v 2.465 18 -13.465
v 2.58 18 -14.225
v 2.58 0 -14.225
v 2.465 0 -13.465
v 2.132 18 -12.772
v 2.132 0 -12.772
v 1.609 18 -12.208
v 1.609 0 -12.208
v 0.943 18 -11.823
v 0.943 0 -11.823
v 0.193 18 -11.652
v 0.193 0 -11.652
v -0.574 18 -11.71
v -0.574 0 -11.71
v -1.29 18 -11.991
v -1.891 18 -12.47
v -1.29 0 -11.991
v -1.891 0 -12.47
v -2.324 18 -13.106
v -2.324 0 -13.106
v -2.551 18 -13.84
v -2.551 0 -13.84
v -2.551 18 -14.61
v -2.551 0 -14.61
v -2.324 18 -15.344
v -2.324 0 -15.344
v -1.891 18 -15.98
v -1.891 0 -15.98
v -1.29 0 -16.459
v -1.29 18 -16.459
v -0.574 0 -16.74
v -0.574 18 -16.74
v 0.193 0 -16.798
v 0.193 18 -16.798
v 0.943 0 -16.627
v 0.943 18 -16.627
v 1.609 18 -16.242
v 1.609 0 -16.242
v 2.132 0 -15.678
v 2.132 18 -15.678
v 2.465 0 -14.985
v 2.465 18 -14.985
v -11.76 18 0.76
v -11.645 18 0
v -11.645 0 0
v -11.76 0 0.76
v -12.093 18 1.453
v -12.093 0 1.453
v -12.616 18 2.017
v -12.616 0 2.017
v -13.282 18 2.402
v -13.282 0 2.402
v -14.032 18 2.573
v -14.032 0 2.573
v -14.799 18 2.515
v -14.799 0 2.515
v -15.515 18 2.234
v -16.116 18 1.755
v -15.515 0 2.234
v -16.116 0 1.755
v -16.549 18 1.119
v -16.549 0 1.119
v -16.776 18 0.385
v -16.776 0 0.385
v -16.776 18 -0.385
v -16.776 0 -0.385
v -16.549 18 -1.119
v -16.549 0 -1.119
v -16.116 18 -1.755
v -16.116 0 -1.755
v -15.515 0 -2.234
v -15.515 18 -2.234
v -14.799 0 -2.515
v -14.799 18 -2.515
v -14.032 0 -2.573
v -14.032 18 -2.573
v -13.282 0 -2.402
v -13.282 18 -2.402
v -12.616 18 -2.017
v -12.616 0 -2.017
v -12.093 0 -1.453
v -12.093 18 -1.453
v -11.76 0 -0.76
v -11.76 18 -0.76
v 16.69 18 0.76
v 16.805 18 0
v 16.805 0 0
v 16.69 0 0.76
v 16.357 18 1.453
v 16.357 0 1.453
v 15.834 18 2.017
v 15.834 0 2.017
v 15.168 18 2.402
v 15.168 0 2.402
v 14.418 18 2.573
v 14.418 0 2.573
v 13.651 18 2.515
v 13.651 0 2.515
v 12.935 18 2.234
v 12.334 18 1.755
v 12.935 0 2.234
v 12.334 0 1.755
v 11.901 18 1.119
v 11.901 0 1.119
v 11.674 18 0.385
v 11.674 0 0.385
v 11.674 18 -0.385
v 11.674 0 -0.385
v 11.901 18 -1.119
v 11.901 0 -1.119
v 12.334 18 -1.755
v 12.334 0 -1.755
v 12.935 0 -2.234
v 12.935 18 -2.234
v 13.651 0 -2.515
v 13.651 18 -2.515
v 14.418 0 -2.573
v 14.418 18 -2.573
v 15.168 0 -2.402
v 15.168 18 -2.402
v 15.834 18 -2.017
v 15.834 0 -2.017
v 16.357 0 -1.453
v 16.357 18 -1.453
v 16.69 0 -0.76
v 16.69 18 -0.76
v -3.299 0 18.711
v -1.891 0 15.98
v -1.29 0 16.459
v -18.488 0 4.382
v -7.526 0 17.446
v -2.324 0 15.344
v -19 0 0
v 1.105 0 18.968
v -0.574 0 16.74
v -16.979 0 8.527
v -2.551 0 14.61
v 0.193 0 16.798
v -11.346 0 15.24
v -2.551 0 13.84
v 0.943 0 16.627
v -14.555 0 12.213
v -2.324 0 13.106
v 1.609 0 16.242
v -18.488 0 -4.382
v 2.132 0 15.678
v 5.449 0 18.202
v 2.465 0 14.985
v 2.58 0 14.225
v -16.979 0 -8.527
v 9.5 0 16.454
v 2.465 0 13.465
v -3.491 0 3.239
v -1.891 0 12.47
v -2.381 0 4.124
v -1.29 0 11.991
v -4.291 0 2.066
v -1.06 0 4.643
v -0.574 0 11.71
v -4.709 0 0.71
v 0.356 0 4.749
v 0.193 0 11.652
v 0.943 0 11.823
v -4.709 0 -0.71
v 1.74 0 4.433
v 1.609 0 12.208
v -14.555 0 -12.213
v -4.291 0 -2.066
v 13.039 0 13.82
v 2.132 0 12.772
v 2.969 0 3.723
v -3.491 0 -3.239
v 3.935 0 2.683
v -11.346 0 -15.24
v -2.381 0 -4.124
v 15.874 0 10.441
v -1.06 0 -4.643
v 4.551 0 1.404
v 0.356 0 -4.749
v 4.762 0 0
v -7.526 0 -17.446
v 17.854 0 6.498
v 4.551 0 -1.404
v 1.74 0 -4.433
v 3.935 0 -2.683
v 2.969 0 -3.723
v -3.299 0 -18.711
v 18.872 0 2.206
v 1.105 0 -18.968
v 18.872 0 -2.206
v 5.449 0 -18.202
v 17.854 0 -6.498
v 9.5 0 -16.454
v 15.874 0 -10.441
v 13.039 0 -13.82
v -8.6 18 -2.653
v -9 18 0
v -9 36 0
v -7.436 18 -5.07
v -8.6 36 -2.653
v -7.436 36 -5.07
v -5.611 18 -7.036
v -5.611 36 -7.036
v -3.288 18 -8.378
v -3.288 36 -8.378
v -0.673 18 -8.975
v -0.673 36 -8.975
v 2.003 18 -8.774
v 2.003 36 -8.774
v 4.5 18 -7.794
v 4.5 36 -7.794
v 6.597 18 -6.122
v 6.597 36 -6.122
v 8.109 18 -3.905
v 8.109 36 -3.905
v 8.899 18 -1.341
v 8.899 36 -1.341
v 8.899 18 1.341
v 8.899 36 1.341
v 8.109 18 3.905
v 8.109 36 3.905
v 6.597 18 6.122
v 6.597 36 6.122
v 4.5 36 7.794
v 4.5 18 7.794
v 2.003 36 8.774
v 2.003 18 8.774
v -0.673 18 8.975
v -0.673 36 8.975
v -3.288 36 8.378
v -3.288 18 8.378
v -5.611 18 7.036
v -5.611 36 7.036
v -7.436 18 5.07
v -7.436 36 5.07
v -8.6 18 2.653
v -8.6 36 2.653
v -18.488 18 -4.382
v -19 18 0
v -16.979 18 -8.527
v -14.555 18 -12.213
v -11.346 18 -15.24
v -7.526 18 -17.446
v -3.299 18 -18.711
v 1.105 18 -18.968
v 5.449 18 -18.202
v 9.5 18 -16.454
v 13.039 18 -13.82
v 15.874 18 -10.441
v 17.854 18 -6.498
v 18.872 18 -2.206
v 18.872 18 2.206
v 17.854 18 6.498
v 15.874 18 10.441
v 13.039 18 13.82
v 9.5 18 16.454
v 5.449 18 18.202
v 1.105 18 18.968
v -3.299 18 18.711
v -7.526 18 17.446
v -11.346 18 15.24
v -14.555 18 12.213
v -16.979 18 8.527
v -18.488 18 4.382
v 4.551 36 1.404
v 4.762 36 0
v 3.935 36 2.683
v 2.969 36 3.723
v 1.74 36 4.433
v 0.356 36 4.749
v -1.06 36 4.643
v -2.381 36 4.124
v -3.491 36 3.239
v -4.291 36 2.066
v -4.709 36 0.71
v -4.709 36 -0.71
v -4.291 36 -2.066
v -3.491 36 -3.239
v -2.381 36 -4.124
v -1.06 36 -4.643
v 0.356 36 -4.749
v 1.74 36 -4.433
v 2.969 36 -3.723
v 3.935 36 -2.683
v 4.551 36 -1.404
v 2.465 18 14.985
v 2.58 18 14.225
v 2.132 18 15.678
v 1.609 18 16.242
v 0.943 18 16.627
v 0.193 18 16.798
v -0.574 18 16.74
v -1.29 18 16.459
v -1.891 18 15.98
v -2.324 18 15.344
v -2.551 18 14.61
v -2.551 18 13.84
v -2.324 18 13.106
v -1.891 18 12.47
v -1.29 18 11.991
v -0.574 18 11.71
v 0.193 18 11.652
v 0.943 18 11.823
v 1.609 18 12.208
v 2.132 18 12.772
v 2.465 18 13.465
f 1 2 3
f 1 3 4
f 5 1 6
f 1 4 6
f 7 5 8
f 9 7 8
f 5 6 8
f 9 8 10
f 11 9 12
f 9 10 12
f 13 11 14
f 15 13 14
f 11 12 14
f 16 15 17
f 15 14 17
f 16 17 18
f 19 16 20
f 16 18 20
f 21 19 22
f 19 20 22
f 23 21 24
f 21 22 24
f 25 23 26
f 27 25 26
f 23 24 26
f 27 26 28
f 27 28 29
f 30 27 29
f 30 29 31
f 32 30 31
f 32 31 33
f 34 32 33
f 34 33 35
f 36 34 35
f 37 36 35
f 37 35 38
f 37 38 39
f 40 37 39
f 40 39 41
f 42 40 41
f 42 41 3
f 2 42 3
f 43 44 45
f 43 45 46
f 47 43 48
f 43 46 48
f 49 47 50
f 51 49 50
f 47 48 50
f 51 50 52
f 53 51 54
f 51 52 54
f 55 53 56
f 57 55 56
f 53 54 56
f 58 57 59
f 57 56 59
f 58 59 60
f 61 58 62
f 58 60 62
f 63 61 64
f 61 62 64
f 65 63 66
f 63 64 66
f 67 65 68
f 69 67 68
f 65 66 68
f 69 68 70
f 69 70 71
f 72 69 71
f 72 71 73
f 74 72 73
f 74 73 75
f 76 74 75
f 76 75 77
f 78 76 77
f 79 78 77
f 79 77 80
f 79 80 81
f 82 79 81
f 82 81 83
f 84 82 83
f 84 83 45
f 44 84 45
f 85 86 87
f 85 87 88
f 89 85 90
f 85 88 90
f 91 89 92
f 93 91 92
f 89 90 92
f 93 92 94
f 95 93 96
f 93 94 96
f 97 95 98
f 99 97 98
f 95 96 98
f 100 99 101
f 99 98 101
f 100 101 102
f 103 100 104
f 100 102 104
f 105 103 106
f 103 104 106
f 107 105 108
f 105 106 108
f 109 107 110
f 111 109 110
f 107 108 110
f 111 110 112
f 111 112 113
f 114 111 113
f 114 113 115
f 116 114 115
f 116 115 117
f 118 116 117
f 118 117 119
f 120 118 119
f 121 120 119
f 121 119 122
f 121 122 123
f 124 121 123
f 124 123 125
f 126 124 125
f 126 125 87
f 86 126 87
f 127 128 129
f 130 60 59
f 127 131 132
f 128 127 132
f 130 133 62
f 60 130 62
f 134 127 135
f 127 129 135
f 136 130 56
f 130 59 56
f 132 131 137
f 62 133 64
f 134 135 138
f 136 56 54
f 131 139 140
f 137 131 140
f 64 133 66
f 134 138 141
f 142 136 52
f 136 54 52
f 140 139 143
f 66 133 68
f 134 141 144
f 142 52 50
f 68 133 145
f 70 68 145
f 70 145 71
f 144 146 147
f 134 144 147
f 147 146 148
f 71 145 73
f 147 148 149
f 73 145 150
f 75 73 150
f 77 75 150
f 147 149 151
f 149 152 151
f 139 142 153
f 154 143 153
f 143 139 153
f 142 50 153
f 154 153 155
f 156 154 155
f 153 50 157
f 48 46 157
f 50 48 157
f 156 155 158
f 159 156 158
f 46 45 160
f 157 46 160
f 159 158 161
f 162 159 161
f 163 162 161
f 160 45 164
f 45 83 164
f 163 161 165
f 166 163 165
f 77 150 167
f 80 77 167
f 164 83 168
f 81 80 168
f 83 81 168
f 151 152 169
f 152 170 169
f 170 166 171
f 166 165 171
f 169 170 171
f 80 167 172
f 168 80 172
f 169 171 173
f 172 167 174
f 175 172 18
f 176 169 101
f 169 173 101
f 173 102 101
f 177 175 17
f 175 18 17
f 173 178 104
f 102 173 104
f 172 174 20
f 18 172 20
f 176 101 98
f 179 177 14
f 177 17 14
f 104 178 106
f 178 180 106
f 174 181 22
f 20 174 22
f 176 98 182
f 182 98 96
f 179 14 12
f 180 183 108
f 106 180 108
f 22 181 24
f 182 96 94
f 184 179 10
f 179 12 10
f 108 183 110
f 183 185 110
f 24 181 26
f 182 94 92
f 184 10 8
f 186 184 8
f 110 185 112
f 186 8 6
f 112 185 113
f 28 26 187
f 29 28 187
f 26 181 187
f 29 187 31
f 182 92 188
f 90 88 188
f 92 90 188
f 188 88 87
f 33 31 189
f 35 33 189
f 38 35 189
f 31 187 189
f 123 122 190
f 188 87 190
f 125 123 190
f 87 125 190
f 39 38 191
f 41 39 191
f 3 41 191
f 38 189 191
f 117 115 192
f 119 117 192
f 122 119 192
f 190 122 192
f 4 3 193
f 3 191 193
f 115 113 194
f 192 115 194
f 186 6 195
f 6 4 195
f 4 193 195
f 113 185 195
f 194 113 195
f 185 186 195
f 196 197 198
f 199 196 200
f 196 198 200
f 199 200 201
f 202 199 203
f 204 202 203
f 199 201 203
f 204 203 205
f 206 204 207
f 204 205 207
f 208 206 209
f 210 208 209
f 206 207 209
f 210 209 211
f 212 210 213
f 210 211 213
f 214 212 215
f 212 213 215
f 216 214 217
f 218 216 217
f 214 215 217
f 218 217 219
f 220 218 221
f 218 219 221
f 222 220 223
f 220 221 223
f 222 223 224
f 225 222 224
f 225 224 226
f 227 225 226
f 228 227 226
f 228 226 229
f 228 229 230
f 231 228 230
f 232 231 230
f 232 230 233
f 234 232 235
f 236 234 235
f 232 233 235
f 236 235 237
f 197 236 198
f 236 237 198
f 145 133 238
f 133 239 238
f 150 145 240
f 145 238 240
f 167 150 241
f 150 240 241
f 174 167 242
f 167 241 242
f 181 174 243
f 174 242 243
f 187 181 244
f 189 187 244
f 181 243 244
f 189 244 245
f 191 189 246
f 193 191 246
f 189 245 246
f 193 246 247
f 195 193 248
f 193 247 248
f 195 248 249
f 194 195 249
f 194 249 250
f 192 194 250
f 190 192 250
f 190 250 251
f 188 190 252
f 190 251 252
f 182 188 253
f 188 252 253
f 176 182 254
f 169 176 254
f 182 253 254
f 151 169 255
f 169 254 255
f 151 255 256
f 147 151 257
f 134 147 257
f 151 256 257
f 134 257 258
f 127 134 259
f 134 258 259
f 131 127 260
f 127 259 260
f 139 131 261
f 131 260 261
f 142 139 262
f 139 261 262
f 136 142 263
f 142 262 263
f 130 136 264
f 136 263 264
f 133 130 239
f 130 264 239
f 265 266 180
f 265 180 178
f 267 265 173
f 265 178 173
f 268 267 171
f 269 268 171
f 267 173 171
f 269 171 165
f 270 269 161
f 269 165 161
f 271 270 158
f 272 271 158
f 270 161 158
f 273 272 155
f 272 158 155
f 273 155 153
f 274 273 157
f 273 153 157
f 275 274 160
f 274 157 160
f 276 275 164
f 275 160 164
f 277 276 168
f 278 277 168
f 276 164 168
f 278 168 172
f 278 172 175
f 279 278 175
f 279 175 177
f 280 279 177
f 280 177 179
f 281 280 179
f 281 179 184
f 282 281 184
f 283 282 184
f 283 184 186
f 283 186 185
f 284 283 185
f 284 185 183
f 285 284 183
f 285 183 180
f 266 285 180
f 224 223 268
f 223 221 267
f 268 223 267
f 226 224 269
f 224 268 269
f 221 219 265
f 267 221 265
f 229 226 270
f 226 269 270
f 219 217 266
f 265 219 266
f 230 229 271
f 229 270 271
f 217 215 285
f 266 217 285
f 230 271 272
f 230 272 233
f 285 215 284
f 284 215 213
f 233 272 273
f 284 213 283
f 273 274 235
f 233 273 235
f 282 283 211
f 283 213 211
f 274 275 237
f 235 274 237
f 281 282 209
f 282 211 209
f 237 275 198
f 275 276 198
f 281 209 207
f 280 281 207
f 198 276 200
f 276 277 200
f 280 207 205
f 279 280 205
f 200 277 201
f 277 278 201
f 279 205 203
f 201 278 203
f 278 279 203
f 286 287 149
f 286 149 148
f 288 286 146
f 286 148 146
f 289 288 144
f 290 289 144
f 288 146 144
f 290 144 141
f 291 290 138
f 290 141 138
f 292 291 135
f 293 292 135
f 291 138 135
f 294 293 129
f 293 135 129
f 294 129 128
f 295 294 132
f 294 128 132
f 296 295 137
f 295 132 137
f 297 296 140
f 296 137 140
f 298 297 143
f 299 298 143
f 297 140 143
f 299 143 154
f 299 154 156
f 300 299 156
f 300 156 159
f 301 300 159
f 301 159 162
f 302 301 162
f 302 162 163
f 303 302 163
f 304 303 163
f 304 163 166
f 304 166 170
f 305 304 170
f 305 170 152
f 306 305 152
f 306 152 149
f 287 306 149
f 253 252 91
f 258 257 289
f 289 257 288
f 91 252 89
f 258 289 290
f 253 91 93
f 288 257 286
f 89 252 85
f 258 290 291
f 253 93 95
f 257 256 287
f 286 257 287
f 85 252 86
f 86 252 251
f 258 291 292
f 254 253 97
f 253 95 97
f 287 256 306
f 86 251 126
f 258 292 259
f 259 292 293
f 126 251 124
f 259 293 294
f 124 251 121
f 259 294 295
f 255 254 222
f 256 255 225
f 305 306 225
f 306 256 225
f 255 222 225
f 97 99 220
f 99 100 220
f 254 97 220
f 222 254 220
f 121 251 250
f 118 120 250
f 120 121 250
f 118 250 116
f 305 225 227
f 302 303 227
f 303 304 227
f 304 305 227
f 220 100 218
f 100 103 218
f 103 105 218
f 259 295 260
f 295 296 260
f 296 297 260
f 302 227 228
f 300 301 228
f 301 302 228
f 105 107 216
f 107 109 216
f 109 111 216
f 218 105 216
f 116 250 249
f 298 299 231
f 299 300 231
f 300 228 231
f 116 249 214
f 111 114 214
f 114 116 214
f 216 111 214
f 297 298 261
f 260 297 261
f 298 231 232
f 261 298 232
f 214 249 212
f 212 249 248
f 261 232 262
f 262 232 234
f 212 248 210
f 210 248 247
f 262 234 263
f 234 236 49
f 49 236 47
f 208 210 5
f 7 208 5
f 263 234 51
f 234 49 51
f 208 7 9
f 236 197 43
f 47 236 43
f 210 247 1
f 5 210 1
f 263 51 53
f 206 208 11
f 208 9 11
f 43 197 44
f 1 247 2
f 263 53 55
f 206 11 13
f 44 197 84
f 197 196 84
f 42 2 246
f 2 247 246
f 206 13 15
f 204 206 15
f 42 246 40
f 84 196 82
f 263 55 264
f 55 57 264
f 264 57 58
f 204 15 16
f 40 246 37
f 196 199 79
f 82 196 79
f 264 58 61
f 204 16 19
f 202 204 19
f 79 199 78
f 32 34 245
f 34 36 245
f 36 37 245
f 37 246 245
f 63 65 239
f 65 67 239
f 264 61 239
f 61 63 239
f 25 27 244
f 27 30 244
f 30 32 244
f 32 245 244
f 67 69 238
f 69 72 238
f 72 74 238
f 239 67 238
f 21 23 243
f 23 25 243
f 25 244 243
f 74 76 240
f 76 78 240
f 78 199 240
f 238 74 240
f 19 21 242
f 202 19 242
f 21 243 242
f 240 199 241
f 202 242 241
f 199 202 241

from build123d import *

# Parameters (mm, degrees)
CUT_EXTRUDE1_REACH = 46.922
SKETCH2_R          = 4.7625
SKETCH3_R          = 2.58
CUT_EXTRUDE2_DEPTH = 45.92215489


with BuildPart() as part:
    # Sketch1 → Revolve1 (revolve)
    with BuildSketch(Plane.XY, mode=Mode.PRIVATE) as revolve1_sk:
        Polygon((0, 0), (19, 0), (19, 18), (9, 18), (9, 36), (0, 36), align=None)
    revolve(revolve1_sk.sketch.rotate(Axis((0, 36, 0), (0, -1, 0)), 180), axis=Axis((0, 36, 0), (0, -1, 0)))

    # Sketch2 → Cut-Extrude1 (cut, up to next)
    with BuildSketch(Plane.XZ, mode=Mode.PRIVATE) as cut_extrude1_sk1:
        Circle(SKETCH2_R)
    cut_extrude1_tool1 = extrude(cut_extrude1_sk1.sketch, amount=-CUT_EXTRUDE1_REACH, mode=Mode.PRIVATE) & part.part
    add(cut_extrude1_tool1.solids().sort_by_distance((0, 0, 0))[0], mode=Mode.SUBTRACT)

    # Sketch3 → Cut-Extrude2 (cut, through all)
    with BuildSketch(Plane.XZ):
        with Locations((0, 14.225)):
            Circle(SKETCH3_R)
        with Locations((14.225, 0)):
            Circle(SKETCH3_R)
        with Locations((0, -14.225)):
            Circle(SKETCH3_R)
        with Locations((-14.225, 0)):
            Circle(SKETCH3_R)
    extrude(amount=-CUT_EXTRUDE2_DEPTH, mode=Mode.SUBTRACT)


solid = part.part
